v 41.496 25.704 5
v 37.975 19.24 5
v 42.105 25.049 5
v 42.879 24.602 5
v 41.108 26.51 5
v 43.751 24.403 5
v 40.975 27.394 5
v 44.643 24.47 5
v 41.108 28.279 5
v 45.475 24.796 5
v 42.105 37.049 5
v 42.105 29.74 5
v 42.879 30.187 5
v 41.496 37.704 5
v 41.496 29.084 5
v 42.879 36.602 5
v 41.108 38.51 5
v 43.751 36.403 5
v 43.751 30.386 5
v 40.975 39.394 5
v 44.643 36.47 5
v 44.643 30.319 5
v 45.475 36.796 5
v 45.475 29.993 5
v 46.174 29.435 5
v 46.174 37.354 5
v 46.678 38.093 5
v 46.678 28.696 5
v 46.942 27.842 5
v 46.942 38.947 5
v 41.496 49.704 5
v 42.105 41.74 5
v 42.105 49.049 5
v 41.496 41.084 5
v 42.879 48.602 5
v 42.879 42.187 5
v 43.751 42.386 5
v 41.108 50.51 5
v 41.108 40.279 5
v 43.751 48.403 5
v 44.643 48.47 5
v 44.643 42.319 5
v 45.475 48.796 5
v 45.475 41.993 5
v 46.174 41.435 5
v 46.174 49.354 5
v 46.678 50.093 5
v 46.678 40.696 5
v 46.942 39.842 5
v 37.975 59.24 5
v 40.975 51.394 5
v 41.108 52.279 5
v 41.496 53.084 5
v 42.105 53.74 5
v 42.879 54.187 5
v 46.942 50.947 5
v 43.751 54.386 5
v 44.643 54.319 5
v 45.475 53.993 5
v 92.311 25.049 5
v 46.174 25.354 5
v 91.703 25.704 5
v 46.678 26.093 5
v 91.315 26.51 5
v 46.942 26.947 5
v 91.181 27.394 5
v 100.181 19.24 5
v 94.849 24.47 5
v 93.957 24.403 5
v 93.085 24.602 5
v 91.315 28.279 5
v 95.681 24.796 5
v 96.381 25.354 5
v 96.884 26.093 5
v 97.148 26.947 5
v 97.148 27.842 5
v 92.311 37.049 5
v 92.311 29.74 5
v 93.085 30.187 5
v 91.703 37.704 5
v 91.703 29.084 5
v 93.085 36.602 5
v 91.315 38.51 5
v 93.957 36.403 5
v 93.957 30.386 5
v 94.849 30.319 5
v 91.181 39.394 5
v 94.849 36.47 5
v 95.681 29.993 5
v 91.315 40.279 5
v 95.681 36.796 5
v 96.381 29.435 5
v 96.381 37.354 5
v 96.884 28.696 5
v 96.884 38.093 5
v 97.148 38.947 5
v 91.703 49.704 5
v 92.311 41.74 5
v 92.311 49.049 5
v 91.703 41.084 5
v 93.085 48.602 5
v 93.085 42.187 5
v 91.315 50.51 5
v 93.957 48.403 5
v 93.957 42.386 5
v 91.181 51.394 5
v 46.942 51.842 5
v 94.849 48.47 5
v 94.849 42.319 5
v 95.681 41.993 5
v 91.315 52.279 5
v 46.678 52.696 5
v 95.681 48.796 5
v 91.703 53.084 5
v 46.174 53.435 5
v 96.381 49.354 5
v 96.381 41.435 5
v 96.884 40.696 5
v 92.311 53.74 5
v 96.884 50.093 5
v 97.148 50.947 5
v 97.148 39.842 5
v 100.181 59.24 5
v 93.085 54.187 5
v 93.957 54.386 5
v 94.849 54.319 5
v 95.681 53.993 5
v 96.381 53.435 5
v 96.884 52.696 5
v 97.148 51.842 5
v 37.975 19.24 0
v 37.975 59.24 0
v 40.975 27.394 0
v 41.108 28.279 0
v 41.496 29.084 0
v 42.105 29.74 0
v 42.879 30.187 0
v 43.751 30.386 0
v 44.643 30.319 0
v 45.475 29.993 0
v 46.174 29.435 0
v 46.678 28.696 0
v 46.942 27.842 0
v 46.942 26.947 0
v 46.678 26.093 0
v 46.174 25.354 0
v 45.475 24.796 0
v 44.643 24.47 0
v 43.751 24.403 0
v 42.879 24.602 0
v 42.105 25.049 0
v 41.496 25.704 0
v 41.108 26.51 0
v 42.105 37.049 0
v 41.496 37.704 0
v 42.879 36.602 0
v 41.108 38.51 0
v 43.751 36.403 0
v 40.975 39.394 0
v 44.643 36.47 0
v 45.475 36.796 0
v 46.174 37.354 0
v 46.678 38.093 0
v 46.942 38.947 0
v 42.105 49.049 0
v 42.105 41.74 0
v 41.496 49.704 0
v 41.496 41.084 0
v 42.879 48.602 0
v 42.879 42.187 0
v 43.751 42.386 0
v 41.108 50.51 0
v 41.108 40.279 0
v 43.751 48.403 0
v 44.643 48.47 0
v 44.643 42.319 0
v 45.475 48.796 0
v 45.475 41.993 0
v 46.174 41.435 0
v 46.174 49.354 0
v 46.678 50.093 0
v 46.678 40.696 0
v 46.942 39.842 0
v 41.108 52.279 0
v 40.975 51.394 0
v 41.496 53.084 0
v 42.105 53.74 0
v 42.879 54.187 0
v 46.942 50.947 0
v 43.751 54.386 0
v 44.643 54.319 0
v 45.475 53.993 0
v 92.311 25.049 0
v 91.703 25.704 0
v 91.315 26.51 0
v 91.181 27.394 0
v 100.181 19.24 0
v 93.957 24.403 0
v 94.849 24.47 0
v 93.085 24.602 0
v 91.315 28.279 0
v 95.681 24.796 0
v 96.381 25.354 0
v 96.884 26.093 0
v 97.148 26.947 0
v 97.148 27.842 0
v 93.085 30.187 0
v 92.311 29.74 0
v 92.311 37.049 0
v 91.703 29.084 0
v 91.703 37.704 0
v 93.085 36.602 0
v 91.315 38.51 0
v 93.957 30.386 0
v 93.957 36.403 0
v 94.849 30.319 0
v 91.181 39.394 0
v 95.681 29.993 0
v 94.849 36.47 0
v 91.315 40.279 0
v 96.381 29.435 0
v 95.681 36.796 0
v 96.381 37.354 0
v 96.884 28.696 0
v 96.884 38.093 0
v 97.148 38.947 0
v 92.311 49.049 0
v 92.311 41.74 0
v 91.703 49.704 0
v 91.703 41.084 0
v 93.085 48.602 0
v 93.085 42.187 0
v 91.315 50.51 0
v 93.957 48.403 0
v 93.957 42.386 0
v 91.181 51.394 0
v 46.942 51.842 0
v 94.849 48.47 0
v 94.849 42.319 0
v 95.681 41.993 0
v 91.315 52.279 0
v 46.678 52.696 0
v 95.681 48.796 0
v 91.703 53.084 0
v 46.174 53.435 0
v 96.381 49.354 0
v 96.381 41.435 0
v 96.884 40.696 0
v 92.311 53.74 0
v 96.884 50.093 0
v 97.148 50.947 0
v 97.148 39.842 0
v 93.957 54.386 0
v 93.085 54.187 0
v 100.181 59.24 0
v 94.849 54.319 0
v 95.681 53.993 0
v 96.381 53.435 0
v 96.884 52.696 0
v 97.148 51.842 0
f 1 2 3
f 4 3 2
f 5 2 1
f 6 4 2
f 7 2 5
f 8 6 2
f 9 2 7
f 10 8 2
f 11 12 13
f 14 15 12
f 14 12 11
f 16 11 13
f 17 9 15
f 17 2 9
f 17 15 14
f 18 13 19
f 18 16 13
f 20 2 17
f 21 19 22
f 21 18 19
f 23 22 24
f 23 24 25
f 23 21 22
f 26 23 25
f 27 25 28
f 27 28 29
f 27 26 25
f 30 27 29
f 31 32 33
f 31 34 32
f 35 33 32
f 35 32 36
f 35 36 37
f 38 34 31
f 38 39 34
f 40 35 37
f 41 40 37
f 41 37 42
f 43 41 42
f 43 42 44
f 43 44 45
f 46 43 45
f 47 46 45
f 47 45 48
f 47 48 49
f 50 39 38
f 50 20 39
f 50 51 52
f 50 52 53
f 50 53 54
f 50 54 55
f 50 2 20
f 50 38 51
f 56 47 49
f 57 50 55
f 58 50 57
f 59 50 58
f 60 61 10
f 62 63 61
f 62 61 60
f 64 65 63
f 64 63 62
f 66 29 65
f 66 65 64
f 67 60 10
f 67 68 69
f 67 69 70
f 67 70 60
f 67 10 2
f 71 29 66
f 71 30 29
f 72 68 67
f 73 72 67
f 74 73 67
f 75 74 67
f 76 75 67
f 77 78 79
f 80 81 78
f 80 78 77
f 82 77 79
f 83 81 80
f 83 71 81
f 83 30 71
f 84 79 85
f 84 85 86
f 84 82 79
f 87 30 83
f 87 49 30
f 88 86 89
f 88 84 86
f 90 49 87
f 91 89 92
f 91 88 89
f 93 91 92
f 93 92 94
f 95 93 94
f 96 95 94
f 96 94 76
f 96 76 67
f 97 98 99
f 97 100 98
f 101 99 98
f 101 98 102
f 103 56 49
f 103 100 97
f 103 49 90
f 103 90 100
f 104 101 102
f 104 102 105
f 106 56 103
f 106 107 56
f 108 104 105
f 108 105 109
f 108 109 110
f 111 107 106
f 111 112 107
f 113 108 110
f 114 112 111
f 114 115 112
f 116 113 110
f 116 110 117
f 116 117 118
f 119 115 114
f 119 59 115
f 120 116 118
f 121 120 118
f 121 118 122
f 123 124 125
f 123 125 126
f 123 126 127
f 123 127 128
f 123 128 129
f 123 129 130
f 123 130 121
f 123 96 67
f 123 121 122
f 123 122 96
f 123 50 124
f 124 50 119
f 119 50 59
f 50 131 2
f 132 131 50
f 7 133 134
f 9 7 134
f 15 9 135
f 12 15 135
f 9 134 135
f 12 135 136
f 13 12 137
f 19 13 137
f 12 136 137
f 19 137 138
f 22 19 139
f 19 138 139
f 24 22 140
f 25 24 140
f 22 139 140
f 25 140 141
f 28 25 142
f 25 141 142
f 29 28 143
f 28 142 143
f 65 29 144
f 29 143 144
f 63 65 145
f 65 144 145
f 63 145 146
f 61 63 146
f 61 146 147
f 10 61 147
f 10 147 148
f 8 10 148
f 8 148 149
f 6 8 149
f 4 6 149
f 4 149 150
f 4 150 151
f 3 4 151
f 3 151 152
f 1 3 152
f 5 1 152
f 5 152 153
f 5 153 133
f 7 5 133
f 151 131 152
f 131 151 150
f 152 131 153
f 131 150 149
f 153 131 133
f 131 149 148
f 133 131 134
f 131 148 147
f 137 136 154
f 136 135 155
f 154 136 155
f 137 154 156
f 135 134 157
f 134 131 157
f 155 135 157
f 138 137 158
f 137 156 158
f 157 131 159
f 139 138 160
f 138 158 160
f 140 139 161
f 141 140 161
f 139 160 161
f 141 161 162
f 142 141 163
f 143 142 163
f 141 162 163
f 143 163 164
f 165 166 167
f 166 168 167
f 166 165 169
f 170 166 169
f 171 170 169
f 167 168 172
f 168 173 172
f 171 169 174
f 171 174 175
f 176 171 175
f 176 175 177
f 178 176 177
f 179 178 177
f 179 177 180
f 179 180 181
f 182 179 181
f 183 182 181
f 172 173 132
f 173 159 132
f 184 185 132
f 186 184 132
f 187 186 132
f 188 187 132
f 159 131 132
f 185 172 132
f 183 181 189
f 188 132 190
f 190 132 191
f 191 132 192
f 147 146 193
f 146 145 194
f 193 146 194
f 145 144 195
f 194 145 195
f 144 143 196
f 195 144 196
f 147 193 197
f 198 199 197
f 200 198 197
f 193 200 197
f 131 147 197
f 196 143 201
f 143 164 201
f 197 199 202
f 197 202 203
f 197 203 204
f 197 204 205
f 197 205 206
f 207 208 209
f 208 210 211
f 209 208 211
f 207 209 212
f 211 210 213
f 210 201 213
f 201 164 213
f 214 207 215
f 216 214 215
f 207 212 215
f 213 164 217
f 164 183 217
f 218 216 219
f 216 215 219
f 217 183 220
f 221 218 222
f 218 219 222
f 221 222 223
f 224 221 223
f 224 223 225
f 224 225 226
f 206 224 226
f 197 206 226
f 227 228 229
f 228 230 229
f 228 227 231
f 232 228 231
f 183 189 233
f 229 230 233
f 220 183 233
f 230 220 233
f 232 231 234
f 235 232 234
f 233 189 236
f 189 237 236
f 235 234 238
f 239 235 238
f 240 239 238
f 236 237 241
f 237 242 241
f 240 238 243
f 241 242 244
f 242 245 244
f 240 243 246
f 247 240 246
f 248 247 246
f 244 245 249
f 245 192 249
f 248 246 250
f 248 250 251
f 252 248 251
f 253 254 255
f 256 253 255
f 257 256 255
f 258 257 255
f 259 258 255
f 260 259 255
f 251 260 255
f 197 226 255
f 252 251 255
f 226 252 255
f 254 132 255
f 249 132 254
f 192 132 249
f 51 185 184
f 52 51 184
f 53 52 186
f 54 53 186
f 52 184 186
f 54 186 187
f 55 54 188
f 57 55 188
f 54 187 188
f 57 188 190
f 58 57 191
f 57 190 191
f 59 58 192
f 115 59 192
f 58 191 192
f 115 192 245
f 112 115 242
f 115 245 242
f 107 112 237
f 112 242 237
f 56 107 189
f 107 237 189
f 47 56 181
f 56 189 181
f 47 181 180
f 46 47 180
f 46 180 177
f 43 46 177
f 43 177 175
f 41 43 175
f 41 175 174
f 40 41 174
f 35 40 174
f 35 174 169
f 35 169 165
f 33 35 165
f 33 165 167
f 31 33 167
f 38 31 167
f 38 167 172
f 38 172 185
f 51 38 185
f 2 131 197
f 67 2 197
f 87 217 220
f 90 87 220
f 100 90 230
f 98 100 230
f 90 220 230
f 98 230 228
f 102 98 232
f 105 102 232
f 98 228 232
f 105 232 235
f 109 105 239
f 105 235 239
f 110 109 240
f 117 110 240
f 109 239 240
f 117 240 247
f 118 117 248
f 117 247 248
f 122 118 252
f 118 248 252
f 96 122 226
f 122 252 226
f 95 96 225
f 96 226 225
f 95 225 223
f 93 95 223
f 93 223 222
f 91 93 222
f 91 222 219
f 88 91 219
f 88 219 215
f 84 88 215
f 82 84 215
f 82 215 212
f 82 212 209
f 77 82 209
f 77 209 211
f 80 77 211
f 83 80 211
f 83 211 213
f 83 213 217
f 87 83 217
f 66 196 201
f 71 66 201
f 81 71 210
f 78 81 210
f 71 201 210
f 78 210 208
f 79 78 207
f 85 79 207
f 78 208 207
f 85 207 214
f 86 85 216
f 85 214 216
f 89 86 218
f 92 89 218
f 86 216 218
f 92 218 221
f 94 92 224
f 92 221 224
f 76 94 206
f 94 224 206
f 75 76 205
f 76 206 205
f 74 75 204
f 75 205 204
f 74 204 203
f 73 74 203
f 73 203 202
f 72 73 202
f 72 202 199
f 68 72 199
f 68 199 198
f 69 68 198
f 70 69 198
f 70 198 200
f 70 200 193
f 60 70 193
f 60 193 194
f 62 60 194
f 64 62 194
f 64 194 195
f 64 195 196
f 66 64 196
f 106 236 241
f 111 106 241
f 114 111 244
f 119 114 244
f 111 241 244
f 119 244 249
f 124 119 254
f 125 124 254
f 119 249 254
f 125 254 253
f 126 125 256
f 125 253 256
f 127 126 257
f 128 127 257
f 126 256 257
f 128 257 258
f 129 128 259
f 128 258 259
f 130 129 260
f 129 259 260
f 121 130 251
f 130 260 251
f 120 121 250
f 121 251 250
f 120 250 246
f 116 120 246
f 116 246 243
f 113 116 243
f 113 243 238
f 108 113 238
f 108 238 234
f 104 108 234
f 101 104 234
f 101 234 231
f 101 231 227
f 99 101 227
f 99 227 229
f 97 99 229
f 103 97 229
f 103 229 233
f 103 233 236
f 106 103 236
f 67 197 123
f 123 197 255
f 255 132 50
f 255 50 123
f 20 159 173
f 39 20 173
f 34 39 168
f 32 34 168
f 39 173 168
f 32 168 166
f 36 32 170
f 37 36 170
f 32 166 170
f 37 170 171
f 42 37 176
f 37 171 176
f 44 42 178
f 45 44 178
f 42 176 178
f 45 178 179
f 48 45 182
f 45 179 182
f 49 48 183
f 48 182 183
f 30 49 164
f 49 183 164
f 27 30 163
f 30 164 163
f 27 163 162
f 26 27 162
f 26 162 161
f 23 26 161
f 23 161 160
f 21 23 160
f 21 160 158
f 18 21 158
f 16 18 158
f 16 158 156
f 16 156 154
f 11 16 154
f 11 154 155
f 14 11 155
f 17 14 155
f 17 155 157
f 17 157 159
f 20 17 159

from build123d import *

# Parameters (mm, degrees)
CROQUIS1_W              = 62.206373562
CROQUIS1_H              = 40
SALIENTE_EXTRUIR1_DEPTH = 5
CROQUIS9_R              = 3
CORTAR_EXTRUIR2_DEPTH   = 10


with BuildPart() as part:
    # Croquis1 → Saliente-Extruir1 (new body)
    with BuildSketch(Plane.XY):
        with Locations((69.078310012, 39.240002825)):
            Rectangle(CROQUIS1_W, CROQUIS1_H)
    extrude(amount=SALIENTE_EXTRUIR1_DEPTH)

    # Croquis9 → Cortar-Extruir2 (cut)
    with BuildSketch(Plane(origin=(0, 0, 0), x_dir=(-1, 0, 0), z_dir=(0, 0, -1))):
        with Locations((-94.181496793, 27.39443436)):
            Circle(CROQUIS9_R)
        with Locations((-94.181496793, 39.39443436)):
            Circle(CROQUIS9_R)
        with Locations((-94.181496793, 51.39443436)):
            Circle(CROQUIS9_R)
        with Locations((-43.975123231, 27.39443436)):
            Circle(CROQUIS9_R)
        with Locations((-43.975123231, 39.39443436)):
            Circle(CROQUIS9_R)
        with Locations((-43.975123231, 51.39443436)):
            Circle(CROQUIS9_R)
    extrude(amount=-CORTAR_EXTRUIR2_DEPTH, mode=Mode.SUBTRACT)


solid = part.part
